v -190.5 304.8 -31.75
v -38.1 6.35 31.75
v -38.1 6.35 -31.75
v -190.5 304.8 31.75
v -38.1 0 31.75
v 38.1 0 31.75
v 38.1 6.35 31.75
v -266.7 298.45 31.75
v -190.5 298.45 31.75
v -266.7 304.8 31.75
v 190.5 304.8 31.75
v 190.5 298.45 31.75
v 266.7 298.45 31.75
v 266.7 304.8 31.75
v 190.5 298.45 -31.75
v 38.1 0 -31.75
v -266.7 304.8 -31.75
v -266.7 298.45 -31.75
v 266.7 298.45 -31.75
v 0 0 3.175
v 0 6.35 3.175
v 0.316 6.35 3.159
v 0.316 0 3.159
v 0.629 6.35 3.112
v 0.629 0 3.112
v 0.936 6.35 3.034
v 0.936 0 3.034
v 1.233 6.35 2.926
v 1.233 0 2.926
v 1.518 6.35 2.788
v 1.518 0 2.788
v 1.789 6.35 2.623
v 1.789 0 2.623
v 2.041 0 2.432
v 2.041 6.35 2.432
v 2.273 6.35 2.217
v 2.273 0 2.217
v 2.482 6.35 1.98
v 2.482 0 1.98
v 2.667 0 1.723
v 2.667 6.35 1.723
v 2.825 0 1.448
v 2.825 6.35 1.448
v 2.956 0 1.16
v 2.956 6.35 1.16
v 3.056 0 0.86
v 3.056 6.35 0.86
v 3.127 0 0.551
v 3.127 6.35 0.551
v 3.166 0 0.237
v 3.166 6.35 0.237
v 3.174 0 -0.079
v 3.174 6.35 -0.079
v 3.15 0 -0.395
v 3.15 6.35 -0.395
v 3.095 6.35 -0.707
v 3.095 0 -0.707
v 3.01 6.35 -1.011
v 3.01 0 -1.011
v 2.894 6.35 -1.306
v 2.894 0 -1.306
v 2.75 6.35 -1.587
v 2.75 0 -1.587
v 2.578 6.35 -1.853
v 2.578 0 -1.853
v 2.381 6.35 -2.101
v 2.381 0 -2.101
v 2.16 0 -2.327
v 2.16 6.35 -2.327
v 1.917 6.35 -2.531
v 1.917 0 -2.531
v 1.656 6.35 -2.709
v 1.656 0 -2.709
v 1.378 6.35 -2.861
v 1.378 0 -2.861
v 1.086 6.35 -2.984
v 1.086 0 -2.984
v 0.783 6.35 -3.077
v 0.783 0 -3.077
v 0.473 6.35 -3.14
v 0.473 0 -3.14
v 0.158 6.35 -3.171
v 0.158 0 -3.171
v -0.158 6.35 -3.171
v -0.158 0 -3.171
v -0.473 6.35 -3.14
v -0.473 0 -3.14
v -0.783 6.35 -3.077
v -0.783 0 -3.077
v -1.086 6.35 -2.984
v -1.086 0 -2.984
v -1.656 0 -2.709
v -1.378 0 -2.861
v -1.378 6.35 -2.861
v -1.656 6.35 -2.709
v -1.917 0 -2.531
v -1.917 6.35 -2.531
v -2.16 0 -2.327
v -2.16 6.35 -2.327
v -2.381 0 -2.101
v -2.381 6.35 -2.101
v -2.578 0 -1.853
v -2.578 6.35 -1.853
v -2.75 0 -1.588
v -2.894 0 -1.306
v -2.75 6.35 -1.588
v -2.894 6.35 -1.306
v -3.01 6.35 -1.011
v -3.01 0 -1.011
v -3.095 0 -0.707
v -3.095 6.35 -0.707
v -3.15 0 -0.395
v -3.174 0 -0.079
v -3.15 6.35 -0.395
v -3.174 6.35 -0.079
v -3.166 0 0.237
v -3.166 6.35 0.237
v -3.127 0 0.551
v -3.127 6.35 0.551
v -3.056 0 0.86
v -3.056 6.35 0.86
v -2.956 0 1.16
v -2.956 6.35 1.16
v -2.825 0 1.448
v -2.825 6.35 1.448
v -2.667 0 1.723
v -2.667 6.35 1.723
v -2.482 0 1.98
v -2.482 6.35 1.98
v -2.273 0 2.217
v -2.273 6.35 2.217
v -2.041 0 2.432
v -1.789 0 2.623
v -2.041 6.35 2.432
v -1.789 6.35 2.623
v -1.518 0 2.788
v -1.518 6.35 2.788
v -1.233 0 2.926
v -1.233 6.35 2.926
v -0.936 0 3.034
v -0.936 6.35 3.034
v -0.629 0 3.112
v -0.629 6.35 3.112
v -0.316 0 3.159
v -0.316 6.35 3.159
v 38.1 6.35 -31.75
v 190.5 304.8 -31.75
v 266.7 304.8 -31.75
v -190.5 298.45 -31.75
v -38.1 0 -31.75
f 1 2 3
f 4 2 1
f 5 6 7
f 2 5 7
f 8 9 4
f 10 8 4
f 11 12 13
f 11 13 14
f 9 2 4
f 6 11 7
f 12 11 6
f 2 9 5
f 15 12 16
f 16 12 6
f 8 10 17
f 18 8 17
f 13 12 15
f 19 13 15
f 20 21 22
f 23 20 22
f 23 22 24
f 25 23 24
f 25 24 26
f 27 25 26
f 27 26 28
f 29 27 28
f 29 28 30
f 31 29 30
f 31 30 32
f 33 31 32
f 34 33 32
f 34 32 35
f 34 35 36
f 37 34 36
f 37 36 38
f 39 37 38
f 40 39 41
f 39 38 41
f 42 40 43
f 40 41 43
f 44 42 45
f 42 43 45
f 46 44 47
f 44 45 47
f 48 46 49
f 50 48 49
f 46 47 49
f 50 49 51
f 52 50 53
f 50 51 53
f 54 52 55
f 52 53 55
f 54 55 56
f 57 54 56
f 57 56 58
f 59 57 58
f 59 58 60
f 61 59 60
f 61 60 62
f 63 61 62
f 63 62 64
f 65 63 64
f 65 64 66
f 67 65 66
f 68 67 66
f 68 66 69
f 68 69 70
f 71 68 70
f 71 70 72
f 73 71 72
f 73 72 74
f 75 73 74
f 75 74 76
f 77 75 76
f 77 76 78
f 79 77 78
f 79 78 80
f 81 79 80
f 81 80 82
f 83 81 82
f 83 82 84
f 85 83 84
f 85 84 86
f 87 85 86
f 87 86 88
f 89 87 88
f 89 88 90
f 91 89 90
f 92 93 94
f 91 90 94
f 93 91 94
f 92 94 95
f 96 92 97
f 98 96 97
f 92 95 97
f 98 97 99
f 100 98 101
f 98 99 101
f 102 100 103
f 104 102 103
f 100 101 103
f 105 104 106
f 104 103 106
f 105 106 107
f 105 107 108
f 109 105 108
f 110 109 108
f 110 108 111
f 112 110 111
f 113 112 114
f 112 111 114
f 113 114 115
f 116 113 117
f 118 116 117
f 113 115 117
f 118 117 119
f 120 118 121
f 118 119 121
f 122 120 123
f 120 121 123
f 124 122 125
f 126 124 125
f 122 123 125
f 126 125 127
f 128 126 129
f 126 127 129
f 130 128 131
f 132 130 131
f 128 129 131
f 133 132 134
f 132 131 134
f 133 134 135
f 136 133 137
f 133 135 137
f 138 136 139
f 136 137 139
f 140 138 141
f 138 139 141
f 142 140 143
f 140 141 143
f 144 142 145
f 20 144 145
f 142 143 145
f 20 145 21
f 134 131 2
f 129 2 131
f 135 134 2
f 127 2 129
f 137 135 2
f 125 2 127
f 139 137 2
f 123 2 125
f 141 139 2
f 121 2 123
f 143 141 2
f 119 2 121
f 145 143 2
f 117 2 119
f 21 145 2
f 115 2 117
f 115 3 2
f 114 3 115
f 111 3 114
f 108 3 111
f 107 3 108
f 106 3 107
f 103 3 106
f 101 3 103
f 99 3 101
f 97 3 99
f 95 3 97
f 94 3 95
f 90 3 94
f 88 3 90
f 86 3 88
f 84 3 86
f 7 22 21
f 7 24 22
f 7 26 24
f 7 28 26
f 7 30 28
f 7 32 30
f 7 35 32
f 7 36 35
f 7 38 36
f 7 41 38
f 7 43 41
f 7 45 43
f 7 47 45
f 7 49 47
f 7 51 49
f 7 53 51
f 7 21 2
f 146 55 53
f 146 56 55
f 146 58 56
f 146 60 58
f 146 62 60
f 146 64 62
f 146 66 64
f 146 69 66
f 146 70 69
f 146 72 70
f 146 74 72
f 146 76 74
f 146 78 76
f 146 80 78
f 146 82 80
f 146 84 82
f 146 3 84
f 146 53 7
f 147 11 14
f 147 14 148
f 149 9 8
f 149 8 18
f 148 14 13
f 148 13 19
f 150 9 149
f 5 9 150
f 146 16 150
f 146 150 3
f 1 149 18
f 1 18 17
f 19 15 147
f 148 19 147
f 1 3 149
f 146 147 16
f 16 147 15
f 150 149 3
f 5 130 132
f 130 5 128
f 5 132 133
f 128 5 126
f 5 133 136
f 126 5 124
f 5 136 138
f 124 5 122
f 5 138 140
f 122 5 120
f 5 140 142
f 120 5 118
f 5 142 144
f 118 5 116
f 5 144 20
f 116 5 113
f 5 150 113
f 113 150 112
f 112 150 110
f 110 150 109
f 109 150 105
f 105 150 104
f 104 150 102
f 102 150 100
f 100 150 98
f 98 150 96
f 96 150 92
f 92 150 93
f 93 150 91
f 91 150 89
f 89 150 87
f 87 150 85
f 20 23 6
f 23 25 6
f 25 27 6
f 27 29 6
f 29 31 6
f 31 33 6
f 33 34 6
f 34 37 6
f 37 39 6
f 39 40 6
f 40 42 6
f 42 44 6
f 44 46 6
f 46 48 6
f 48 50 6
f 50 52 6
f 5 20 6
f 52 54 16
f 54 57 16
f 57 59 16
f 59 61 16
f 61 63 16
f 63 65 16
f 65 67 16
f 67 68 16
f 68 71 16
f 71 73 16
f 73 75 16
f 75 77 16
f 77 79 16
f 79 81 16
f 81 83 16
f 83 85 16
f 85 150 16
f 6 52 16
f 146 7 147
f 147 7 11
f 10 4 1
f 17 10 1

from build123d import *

# Parameters (mm, degrees)
SKETCH1_W           = 76.2
SKETCH1_H           = 63.5
BOSS_EXTRUDE1_DEPTH = 6.35
SKETCH2_R           = 3.175
CUT_EXTRUDE1_DEPTH  = 50.99995
BOSS_EXTRUDE2_DEPTH = 63.5
SKETCH4_W           = 63.5
SKETCH4_H           = 6.35
BOSS_EXTRUDE3_DEPTH = 76.2


with BuildPart() as part:
    # Sketch1 → Boss-Extrude1 (new body)
    with BuildSketch(Plane(origin=(0, 0, 0), x_dir=(1, 0, 0), z_dir=(0, 1, 0))):
        Rectangle(SKETCH1_W, SKETCH1_H)
    extrude(amount=BOSS_EXTRUDE1_DEPTH)

    # Sketch2 → Cut-Extrude1 (cut, through all)
    with BuildSketch(Plane(origin=(0, 6.35, 0), x_dir=(1, 0, 0), z_dir=(0, 1, 0))):
        with Locations(Location((0, 0, 0), (0, 0, 270))):
            Circle(SKETCH2_R)
    extrude(amount=-CUT_EXTRUDE1_DEPTH, mode=Mode.SUBTRACT)

    # Sketch3 → Boss-Extrude2 (add)
    with BuildSketch(Plane.XY.offset(31.75)):
        Polygon((38.1, 6.35), (190.5, 304.8), (190.5, 298.45), (38.1, 0), align=None)
    boss_extrude2 = extrude(amount=-BOSS_EXTRUDE2_DEPTH)

    # Sketch4 → Boss-Extrude3 (add)
    with BuildSketch(Plane(origin=(190.5, 0, 0), x_dir=(0, 0, -1), z_dir=(1, 0, 0))):
        with Locations((0, 301.625)):
            Rectangle(SKETCH4_W, SKETCH4_H)
    boss_extrude3 = extrude(amount=BOSS_EXTRUDE3_DEPTH)

    # Mirror1: Boss-Extrude2, Boss-Extrude3 across plane
    add(boss_extrude2.mirror(Plane(origin=(0, 0, 0), x_dir=(0, 0, 1), z_dir=(1, 0, 0))))
    add(boss_extrude3.mirror(Plane(origin=(0, 0, 0), x_dir=(0, 0, 1), z_dir=(1, 0, 0))))


solid = part.part
